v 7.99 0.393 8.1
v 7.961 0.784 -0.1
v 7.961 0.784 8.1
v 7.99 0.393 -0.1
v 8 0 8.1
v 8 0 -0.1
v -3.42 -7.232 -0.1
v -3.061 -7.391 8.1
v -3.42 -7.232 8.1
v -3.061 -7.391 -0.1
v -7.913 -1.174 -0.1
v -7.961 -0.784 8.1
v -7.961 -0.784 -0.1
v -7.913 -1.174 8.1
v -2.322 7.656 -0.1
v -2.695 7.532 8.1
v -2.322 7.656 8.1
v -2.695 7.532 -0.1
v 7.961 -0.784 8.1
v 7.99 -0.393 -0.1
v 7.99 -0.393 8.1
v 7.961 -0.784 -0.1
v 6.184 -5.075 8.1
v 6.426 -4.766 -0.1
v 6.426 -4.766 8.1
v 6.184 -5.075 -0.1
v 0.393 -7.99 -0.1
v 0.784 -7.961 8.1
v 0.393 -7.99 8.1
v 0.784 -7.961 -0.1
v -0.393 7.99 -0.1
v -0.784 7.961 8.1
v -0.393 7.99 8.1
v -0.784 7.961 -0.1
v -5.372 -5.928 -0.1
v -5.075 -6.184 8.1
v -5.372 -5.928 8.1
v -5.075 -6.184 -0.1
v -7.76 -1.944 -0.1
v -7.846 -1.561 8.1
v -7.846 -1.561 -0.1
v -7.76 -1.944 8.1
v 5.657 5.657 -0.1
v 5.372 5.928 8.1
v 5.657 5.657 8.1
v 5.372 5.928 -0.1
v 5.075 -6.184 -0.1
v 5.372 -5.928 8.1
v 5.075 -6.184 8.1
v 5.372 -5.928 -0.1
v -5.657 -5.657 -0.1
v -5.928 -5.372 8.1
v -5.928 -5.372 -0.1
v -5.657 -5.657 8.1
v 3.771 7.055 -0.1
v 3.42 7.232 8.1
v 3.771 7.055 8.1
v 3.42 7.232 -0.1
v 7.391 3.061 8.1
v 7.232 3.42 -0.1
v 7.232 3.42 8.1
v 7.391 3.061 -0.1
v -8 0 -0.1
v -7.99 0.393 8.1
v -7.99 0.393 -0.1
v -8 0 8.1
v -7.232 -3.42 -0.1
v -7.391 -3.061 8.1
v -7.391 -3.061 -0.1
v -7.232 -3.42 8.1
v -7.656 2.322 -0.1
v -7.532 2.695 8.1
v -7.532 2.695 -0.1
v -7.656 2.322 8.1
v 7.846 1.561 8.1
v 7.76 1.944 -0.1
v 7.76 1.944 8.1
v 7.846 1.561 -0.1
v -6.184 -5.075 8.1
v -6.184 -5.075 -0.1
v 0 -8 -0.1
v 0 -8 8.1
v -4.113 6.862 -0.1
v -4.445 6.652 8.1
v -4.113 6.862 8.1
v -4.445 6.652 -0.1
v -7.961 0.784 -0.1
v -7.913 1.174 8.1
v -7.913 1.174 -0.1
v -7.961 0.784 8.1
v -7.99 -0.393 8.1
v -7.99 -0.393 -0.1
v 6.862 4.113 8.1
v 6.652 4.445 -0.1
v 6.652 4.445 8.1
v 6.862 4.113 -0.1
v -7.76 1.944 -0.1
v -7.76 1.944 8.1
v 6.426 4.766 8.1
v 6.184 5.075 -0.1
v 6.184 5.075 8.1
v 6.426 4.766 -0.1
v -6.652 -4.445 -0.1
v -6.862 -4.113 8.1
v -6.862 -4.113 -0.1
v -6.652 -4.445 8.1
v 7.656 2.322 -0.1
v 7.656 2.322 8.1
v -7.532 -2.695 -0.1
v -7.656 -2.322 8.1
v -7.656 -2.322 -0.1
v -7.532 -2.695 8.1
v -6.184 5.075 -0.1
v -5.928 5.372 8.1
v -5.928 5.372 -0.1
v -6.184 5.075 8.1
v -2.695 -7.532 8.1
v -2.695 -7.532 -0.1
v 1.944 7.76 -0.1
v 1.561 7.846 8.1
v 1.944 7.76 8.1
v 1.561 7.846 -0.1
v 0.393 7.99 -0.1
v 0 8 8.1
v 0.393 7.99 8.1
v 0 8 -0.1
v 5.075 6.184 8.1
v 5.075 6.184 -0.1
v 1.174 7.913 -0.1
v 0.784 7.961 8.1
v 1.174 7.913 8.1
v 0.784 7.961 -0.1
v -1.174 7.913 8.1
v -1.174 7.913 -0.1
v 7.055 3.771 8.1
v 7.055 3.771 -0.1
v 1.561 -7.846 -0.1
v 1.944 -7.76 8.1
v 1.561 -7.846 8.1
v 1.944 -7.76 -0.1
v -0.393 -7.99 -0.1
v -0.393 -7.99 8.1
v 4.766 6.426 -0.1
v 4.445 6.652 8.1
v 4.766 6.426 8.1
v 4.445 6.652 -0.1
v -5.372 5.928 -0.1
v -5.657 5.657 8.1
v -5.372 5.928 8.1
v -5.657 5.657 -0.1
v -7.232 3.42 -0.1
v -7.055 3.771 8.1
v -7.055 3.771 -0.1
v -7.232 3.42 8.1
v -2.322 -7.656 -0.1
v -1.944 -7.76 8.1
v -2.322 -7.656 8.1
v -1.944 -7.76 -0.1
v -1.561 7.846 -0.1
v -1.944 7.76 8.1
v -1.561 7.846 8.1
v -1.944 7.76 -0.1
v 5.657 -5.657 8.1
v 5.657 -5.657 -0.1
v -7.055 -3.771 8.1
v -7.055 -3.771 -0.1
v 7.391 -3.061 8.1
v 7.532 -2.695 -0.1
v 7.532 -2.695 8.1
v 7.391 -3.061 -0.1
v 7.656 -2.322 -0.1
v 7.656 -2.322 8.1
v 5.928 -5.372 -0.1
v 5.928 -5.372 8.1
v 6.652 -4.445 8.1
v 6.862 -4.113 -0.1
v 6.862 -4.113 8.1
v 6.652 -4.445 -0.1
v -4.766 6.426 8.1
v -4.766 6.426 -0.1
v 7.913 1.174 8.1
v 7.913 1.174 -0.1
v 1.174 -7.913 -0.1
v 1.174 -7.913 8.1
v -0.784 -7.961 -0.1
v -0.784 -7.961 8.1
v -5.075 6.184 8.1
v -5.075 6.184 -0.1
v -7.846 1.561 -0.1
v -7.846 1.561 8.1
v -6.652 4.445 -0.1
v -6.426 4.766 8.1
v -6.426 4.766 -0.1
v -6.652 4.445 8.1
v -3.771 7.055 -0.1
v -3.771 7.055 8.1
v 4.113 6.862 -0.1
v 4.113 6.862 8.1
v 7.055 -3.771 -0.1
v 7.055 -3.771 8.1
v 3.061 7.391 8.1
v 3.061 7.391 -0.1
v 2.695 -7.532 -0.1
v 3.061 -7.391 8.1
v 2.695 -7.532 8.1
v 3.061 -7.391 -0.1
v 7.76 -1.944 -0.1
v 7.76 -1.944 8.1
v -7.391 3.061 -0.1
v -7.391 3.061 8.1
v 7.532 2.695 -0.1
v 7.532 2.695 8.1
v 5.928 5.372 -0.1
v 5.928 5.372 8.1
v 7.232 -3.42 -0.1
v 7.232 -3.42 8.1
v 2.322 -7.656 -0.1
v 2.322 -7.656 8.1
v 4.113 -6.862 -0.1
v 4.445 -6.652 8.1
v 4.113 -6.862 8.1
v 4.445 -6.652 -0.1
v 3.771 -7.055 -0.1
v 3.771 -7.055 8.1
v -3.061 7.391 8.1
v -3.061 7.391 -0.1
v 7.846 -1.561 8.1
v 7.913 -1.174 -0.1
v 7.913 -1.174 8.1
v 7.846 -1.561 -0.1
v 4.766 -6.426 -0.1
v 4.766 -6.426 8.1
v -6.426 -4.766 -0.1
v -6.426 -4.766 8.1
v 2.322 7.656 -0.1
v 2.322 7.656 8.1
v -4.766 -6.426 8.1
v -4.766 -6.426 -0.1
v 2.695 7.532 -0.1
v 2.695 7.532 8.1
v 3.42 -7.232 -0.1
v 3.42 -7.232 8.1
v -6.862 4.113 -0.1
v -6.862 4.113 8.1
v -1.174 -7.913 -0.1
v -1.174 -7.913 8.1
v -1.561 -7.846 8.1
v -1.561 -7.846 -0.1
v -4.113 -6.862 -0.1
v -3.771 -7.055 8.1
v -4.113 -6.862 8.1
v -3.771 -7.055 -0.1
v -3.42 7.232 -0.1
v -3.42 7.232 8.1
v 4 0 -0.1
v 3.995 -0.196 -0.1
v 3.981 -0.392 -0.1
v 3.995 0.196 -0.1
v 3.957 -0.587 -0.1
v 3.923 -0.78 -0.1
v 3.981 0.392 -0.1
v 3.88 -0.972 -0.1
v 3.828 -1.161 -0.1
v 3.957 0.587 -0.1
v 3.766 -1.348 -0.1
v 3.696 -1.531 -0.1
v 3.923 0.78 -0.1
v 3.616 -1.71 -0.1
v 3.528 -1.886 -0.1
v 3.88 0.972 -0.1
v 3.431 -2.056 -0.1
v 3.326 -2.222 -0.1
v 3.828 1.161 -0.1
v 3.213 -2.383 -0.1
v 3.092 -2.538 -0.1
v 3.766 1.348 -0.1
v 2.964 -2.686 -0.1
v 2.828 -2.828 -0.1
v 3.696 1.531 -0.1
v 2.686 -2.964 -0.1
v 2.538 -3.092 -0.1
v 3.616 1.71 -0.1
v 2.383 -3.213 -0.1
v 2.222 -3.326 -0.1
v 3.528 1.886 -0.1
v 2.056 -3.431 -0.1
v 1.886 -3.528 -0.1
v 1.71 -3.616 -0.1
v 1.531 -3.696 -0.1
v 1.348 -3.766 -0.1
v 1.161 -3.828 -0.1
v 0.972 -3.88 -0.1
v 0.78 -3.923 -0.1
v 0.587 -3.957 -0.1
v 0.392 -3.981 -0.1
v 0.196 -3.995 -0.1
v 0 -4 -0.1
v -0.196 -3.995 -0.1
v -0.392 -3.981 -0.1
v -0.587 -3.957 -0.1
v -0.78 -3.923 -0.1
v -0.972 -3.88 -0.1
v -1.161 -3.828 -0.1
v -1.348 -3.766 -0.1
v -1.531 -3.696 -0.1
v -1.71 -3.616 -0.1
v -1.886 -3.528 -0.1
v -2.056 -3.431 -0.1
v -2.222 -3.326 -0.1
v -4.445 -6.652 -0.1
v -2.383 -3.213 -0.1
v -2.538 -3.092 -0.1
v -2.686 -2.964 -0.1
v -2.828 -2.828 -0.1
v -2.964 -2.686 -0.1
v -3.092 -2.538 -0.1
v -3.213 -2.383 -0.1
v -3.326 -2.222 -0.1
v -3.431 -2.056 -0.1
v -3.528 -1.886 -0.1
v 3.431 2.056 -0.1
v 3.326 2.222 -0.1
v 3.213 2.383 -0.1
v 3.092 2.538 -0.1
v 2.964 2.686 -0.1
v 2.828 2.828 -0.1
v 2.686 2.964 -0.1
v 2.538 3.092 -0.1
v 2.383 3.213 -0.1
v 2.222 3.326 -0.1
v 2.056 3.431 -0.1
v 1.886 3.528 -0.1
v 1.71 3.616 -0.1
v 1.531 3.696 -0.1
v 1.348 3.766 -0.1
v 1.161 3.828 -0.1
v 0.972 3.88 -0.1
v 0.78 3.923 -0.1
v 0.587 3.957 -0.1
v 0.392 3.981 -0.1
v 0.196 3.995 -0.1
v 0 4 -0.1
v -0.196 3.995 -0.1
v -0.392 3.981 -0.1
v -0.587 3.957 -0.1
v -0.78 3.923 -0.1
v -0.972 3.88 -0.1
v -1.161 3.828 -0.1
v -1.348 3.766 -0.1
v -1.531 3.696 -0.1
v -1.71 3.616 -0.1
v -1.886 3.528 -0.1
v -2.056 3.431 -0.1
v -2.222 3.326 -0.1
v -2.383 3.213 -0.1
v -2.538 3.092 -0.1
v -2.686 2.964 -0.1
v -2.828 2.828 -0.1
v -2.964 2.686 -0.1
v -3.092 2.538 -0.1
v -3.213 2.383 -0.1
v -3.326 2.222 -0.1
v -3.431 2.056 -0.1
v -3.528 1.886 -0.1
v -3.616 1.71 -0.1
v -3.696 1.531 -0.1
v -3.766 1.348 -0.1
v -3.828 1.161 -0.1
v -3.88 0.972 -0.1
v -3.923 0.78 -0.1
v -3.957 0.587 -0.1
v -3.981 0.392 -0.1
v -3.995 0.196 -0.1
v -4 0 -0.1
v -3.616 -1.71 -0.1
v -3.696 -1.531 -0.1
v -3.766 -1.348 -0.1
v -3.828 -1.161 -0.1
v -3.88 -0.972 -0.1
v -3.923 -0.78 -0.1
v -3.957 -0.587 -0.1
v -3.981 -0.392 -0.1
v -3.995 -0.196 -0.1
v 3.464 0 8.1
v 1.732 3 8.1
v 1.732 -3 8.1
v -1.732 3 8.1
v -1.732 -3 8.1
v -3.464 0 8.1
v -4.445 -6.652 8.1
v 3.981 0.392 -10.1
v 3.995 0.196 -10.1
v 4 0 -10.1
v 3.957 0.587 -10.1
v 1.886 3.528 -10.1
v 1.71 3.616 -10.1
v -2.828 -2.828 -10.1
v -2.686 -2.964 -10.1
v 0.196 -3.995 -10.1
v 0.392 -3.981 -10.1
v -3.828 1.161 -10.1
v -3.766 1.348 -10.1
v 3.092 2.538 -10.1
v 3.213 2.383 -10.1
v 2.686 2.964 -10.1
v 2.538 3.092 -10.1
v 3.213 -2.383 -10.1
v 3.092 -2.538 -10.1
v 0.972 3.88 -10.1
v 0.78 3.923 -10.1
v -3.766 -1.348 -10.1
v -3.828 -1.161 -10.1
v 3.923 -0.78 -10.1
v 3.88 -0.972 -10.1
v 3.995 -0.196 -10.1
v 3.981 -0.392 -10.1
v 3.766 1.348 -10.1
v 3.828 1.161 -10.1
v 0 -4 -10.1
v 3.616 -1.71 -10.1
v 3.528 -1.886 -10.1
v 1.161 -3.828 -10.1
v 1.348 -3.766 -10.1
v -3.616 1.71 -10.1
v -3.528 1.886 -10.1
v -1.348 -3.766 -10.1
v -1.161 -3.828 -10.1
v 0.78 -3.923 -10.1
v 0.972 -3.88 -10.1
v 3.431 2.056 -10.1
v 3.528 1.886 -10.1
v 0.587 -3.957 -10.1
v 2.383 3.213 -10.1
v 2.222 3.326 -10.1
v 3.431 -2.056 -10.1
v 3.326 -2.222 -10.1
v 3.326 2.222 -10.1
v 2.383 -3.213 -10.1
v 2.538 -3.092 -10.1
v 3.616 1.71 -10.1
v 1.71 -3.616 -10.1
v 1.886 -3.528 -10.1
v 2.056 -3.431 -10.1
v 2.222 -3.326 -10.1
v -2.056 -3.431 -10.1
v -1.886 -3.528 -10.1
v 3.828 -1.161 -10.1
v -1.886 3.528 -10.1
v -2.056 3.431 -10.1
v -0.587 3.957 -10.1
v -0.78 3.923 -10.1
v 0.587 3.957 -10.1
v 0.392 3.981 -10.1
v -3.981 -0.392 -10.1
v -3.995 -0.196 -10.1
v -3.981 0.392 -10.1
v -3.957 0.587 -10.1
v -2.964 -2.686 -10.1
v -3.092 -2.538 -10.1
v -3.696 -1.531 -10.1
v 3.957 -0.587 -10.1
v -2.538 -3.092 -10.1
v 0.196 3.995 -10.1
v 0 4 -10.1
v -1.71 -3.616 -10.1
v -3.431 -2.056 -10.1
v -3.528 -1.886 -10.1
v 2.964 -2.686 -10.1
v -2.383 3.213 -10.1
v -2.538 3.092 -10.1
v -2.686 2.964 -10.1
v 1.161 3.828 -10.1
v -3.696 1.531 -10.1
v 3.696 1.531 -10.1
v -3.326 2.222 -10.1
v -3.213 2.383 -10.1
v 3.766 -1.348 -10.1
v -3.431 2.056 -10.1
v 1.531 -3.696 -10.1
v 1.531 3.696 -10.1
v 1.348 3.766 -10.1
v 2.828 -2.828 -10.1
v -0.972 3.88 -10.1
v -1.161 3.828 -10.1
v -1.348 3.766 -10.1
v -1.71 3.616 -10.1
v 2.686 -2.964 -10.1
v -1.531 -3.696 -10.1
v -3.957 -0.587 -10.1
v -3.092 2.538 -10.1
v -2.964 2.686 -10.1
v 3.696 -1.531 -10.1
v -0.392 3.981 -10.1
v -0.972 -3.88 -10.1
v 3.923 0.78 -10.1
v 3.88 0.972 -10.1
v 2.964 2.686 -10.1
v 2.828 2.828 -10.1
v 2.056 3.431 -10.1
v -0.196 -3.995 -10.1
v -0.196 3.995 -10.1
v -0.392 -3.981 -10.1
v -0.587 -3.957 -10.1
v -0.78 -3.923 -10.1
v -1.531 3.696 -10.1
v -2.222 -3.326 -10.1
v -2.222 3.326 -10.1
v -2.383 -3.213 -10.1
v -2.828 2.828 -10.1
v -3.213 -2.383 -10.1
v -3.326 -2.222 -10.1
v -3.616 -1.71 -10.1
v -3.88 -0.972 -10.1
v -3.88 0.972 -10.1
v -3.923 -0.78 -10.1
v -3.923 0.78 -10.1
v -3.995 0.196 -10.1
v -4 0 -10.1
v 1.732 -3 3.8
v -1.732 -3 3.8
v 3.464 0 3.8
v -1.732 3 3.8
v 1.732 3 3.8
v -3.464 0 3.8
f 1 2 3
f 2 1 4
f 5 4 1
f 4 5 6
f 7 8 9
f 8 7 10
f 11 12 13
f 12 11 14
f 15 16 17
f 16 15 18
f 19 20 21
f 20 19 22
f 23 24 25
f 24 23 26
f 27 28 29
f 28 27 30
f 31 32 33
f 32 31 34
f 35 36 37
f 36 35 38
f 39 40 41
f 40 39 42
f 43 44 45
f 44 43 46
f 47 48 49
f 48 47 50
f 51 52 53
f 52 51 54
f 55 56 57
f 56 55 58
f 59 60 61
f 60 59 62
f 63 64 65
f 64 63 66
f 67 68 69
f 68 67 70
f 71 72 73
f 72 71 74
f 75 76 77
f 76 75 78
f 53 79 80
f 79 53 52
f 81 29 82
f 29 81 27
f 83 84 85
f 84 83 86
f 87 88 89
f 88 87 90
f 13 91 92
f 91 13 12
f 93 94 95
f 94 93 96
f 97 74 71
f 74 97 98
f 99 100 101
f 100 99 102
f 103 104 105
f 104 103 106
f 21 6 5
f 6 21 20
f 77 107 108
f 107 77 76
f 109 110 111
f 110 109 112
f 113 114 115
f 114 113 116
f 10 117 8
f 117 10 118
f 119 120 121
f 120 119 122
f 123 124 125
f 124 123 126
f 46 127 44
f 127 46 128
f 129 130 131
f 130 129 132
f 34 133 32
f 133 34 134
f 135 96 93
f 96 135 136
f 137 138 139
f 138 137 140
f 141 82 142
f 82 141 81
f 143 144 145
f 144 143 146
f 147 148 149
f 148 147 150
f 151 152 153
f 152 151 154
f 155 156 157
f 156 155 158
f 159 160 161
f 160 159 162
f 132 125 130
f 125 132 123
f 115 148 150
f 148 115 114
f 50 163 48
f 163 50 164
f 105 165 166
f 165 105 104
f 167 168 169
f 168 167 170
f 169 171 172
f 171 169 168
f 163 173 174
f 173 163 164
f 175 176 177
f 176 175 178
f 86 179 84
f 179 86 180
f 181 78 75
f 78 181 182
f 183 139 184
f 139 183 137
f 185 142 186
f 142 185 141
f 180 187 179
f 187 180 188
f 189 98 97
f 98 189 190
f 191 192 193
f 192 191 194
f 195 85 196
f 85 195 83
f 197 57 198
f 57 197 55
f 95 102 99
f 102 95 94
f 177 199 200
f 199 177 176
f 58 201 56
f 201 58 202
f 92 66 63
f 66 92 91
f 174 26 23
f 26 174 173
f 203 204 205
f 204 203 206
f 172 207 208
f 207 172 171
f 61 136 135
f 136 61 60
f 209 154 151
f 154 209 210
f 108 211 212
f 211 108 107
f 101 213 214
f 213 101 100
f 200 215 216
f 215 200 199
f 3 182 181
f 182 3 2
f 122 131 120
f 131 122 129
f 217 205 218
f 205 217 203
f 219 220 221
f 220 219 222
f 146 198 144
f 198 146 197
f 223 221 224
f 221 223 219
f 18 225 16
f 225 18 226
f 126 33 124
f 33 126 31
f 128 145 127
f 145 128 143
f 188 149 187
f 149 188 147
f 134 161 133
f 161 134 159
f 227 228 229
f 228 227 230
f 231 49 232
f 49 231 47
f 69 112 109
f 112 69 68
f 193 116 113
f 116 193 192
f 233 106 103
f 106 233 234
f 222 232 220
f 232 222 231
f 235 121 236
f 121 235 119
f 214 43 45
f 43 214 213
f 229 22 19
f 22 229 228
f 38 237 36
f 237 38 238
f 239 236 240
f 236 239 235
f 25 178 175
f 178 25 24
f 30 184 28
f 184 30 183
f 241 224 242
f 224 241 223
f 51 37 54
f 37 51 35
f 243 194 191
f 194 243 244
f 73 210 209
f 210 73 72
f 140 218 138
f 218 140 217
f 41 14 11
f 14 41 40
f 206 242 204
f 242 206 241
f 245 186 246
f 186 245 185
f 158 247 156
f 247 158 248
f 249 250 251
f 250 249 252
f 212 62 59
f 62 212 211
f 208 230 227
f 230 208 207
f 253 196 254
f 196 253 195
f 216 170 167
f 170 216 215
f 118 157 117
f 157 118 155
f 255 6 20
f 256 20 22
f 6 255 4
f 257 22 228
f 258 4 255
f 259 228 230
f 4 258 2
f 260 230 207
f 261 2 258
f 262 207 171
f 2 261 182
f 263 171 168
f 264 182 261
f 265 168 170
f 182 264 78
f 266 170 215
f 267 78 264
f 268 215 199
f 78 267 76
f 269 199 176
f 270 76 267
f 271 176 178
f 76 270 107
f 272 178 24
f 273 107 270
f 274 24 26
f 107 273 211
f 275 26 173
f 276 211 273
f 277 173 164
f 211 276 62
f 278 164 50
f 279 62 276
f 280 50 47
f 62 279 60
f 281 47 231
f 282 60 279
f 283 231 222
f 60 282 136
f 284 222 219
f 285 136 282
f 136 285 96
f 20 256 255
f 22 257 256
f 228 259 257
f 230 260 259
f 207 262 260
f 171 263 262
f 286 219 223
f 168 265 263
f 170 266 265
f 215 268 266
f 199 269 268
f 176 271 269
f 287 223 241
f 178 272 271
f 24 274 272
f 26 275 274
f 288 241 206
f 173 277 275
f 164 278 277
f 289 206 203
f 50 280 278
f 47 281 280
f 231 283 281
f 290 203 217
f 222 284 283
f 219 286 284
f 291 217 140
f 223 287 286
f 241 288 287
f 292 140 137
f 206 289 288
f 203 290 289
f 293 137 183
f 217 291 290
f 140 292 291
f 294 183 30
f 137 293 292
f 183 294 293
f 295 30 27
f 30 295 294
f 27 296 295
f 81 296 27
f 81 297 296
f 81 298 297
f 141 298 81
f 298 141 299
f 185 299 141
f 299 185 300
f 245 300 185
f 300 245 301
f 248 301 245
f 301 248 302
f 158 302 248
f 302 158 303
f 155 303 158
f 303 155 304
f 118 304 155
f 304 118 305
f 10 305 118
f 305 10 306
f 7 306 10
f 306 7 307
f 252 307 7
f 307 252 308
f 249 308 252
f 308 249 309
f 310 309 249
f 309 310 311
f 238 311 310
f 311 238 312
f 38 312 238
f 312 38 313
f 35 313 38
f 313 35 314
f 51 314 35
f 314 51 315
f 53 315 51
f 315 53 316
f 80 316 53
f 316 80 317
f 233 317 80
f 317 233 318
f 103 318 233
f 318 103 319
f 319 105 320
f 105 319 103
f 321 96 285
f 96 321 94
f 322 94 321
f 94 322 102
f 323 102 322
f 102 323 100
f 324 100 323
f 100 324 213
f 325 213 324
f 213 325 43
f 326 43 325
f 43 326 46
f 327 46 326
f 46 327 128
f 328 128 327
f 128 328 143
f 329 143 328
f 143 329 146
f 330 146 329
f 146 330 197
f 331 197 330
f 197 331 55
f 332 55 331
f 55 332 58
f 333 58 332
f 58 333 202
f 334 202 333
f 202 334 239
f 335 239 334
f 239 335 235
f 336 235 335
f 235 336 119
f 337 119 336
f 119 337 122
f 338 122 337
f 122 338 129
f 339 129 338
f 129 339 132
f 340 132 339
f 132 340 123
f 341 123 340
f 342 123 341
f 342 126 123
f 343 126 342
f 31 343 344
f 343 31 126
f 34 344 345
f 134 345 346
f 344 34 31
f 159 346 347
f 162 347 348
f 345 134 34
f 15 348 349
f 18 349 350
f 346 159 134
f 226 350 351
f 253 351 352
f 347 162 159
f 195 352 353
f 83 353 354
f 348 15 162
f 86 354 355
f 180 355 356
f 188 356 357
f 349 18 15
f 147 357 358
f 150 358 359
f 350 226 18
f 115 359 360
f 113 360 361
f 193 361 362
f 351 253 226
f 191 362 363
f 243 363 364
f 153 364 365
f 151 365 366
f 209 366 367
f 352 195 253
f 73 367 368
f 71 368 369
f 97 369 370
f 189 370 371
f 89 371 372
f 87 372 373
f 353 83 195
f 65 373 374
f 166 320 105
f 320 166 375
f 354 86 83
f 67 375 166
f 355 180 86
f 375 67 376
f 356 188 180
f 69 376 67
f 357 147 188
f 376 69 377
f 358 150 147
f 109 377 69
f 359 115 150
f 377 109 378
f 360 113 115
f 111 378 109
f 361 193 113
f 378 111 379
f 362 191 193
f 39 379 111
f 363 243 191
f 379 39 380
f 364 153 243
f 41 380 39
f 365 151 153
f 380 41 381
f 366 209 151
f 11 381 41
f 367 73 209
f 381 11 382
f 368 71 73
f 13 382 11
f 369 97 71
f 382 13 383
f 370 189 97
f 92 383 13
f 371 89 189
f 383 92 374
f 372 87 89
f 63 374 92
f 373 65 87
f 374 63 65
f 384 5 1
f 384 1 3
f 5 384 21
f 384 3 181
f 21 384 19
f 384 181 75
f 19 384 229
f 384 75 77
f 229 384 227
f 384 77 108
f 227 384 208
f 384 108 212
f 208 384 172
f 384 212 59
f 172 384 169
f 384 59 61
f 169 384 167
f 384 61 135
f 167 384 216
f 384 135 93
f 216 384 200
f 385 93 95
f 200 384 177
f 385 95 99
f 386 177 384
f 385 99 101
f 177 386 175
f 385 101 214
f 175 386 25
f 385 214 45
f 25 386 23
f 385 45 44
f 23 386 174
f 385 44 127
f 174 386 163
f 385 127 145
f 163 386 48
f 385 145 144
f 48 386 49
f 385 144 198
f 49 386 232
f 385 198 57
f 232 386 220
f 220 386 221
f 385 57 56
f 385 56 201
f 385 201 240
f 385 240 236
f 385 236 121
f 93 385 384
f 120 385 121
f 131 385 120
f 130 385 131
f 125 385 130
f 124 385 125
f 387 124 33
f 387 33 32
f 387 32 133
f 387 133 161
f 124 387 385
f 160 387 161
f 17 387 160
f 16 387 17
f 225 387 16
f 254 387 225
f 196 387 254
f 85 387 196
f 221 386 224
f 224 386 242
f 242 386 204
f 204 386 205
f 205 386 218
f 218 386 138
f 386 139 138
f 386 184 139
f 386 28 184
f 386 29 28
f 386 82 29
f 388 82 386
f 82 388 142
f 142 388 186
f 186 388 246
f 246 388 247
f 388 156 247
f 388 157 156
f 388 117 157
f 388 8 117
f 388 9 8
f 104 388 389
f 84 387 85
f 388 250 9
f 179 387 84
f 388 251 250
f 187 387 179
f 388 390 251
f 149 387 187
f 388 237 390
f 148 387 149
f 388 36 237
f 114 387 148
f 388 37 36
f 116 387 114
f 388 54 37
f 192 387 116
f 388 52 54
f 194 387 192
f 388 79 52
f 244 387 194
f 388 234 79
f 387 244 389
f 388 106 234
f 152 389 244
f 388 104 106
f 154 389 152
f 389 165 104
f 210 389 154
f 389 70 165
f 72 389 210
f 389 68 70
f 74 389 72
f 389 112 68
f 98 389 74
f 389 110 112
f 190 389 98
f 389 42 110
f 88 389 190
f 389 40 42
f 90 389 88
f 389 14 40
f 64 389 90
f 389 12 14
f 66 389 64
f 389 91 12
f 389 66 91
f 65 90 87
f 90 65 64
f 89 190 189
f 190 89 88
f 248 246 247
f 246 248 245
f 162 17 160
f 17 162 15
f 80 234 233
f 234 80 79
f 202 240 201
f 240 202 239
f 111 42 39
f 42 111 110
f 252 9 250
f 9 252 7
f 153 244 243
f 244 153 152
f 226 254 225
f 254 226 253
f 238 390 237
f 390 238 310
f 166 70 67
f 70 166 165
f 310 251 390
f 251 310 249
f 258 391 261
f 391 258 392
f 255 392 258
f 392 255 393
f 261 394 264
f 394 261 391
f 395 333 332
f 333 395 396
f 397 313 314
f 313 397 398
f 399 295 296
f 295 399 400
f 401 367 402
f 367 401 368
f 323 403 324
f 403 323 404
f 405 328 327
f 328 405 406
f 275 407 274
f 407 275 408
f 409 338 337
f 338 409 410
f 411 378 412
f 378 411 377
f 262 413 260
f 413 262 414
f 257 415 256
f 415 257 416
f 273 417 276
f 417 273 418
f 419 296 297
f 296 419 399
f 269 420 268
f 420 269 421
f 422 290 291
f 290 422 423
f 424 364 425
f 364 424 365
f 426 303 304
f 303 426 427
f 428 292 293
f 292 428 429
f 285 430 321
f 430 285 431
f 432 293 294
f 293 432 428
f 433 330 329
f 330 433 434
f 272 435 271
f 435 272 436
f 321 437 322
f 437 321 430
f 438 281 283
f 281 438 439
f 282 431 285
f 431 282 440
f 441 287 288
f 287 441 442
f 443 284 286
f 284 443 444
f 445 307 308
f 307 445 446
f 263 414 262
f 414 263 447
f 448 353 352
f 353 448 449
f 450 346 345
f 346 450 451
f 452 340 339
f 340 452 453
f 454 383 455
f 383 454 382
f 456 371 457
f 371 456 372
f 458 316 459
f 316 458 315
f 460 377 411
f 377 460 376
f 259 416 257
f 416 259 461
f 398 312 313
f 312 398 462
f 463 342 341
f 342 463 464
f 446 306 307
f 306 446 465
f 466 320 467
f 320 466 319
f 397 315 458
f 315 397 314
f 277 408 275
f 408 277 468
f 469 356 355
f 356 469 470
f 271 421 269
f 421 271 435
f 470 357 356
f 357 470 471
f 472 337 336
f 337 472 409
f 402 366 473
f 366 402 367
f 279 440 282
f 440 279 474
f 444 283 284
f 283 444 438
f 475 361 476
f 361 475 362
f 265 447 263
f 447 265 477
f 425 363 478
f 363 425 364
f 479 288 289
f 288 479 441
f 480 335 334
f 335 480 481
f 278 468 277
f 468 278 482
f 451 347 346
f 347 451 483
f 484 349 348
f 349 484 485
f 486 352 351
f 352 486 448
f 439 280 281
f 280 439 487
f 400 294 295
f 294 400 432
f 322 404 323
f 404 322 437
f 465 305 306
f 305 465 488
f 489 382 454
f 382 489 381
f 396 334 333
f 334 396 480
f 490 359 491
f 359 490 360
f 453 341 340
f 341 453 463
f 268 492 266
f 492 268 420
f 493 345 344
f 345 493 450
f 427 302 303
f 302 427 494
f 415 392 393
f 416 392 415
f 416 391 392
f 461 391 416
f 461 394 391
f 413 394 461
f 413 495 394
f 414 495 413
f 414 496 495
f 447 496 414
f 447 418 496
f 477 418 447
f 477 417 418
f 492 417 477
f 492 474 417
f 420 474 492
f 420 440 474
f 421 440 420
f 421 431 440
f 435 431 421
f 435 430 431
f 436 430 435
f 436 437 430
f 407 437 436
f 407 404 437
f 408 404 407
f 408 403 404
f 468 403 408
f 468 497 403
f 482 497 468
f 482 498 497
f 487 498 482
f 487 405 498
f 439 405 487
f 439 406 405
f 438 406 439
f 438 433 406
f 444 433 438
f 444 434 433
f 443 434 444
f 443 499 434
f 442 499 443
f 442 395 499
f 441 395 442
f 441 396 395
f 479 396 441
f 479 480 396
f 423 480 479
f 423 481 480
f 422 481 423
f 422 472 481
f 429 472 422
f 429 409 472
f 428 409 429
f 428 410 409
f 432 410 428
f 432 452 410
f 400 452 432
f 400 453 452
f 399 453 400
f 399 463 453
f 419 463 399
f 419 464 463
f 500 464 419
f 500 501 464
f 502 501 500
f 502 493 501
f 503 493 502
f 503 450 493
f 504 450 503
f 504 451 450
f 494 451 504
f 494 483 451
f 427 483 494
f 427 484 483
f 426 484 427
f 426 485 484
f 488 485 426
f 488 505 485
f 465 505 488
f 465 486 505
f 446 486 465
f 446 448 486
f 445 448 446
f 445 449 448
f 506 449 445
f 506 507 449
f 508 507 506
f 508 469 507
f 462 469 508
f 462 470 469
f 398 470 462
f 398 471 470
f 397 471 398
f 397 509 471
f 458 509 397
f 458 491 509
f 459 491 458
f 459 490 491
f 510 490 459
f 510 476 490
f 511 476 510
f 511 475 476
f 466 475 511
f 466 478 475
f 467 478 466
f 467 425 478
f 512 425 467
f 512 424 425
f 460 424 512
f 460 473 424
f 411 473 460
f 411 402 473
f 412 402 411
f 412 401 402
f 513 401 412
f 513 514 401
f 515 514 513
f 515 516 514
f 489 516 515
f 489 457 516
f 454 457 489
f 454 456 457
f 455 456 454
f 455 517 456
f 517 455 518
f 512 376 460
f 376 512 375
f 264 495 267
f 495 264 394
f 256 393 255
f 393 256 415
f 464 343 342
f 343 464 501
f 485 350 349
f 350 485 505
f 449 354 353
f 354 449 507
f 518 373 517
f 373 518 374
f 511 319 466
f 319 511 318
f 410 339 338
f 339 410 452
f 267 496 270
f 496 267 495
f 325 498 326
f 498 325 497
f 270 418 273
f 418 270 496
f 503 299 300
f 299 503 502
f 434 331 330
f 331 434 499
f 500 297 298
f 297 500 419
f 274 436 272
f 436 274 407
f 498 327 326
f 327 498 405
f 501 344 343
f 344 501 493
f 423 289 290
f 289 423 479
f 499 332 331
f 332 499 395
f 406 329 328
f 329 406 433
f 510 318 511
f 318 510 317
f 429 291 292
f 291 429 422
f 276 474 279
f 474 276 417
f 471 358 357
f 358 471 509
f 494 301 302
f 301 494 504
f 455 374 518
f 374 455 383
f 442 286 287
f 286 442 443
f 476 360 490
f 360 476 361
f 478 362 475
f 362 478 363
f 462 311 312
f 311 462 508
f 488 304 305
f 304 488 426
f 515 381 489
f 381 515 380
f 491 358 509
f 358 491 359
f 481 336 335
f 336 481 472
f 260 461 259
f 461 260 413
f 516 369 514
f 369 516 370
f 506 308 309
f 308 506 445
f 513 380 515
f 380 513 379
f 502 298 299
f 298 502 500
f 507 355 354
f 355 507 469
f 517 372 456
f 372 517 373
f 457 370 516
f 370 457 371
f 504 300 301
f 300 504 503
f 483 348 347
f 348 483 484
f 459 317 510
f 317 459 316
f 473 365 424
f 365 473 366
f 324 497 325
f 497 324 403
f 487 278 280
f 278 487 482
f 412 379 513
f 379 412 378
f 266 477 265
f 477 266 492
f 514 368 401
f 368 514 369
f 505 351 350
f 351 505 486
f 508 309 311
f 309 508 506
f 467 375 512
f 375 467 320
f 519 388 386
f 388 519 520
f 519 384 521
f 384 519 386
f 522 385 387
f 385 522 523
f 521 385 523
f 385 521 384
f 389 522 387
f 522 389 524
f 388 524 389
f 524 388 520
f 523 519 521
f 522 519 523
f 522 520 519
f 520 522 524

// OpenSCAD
// Socket head cap screw (simplified, one connected solid)
// Requested: 8.0mm shank diameter, 16.0mm head diameter, 10mm under-head length

shaft_diameter = 8;          //[4:16:0.1]
length = 10;                 //[5:30:0.1]   // under-head length
head_diameter = 16;          //[8:32:0.1]
head_height = 8;             //[4:16:0.1]
socket_af = 6;               //[3:12:0.1]   // hex across flats
socket_depth = 4;            //[2:8:0.1]
thread_length = 8;           //[0:20:0.1]   // visual only (no helical thread)
thread_minor_diameter = 7.2; //[3.6:14.4:0.1]
tip_length = 1.2;            //[0.2:3:0.1]  // conical tip length
overlap = 0.2;               //[0.05:1:0.05]
$fn = 128;

// Hex prism sized by across-flats (AF)
module hex_prism_af(af, h) {
    R = (af/2) / cos(30); // circumradius from across-flats
    cylinder(h=h, r=R, center=true, $fn=6);
}

module socket_head_cap_screw() {
    shank_r = shaft_diameter/2;
    head_r  = head_diameter/2;

    // Clamp dependent lengths so everything stays connected and within the shank length
    tlen = min(thread_length, max(0, length));
    tipl = min(tip_length, max(0, length));
    // Ensure the "threaded" section doesn't extend into the conical tip region
    tlen_eff = max(0, min(tlen, length - tipl));

    // Coordinate system:
    // Under-head plane at z=0
    // Head spans z=[0, head_height]
    // Shank spans z=[-length, 0]
    difference() {
        union() {
            // Head (cylindrical)
            translate([0, 0, head_height/2])
                cylinder(h=head_height + overlap, r=head_r, center=true);

            // Shank major diameter (unthreaded portion)
            translate([0, 0, -length/2])
                cylinder(h=length + overlap, r=shank_r, center=true);

            // Visual "threaded" portion as a minor-diameter sleeve near the tip (still connected)
            if (tlen_eff > 0)
                translate([0, 0, -length + tipl + tlen_eff/2])
                    cylinder(h=tlen_eff + overlap, r=thread_minor_diameter/2, center=true);

            // Screw tip (conical), connected to shank at z = -length + tipl
            if (tipl > 0)
                translate([0, 0, -length + tipl/2])
                    cylinder(h=tipl + overlap, r1=thread_minor_diameter/2, r2=0.01, center=true);
        }

        // Internal hex socket recess (subtracted from head)
        // Top face at z=head_height, recess goes down by socket_depth
        translate([0, 0, head_height - socket_depth/2])
            hex_prism_af(socket_af, socket_depth + 2*overlap);
    }
}

socket_head_cap_screw();
